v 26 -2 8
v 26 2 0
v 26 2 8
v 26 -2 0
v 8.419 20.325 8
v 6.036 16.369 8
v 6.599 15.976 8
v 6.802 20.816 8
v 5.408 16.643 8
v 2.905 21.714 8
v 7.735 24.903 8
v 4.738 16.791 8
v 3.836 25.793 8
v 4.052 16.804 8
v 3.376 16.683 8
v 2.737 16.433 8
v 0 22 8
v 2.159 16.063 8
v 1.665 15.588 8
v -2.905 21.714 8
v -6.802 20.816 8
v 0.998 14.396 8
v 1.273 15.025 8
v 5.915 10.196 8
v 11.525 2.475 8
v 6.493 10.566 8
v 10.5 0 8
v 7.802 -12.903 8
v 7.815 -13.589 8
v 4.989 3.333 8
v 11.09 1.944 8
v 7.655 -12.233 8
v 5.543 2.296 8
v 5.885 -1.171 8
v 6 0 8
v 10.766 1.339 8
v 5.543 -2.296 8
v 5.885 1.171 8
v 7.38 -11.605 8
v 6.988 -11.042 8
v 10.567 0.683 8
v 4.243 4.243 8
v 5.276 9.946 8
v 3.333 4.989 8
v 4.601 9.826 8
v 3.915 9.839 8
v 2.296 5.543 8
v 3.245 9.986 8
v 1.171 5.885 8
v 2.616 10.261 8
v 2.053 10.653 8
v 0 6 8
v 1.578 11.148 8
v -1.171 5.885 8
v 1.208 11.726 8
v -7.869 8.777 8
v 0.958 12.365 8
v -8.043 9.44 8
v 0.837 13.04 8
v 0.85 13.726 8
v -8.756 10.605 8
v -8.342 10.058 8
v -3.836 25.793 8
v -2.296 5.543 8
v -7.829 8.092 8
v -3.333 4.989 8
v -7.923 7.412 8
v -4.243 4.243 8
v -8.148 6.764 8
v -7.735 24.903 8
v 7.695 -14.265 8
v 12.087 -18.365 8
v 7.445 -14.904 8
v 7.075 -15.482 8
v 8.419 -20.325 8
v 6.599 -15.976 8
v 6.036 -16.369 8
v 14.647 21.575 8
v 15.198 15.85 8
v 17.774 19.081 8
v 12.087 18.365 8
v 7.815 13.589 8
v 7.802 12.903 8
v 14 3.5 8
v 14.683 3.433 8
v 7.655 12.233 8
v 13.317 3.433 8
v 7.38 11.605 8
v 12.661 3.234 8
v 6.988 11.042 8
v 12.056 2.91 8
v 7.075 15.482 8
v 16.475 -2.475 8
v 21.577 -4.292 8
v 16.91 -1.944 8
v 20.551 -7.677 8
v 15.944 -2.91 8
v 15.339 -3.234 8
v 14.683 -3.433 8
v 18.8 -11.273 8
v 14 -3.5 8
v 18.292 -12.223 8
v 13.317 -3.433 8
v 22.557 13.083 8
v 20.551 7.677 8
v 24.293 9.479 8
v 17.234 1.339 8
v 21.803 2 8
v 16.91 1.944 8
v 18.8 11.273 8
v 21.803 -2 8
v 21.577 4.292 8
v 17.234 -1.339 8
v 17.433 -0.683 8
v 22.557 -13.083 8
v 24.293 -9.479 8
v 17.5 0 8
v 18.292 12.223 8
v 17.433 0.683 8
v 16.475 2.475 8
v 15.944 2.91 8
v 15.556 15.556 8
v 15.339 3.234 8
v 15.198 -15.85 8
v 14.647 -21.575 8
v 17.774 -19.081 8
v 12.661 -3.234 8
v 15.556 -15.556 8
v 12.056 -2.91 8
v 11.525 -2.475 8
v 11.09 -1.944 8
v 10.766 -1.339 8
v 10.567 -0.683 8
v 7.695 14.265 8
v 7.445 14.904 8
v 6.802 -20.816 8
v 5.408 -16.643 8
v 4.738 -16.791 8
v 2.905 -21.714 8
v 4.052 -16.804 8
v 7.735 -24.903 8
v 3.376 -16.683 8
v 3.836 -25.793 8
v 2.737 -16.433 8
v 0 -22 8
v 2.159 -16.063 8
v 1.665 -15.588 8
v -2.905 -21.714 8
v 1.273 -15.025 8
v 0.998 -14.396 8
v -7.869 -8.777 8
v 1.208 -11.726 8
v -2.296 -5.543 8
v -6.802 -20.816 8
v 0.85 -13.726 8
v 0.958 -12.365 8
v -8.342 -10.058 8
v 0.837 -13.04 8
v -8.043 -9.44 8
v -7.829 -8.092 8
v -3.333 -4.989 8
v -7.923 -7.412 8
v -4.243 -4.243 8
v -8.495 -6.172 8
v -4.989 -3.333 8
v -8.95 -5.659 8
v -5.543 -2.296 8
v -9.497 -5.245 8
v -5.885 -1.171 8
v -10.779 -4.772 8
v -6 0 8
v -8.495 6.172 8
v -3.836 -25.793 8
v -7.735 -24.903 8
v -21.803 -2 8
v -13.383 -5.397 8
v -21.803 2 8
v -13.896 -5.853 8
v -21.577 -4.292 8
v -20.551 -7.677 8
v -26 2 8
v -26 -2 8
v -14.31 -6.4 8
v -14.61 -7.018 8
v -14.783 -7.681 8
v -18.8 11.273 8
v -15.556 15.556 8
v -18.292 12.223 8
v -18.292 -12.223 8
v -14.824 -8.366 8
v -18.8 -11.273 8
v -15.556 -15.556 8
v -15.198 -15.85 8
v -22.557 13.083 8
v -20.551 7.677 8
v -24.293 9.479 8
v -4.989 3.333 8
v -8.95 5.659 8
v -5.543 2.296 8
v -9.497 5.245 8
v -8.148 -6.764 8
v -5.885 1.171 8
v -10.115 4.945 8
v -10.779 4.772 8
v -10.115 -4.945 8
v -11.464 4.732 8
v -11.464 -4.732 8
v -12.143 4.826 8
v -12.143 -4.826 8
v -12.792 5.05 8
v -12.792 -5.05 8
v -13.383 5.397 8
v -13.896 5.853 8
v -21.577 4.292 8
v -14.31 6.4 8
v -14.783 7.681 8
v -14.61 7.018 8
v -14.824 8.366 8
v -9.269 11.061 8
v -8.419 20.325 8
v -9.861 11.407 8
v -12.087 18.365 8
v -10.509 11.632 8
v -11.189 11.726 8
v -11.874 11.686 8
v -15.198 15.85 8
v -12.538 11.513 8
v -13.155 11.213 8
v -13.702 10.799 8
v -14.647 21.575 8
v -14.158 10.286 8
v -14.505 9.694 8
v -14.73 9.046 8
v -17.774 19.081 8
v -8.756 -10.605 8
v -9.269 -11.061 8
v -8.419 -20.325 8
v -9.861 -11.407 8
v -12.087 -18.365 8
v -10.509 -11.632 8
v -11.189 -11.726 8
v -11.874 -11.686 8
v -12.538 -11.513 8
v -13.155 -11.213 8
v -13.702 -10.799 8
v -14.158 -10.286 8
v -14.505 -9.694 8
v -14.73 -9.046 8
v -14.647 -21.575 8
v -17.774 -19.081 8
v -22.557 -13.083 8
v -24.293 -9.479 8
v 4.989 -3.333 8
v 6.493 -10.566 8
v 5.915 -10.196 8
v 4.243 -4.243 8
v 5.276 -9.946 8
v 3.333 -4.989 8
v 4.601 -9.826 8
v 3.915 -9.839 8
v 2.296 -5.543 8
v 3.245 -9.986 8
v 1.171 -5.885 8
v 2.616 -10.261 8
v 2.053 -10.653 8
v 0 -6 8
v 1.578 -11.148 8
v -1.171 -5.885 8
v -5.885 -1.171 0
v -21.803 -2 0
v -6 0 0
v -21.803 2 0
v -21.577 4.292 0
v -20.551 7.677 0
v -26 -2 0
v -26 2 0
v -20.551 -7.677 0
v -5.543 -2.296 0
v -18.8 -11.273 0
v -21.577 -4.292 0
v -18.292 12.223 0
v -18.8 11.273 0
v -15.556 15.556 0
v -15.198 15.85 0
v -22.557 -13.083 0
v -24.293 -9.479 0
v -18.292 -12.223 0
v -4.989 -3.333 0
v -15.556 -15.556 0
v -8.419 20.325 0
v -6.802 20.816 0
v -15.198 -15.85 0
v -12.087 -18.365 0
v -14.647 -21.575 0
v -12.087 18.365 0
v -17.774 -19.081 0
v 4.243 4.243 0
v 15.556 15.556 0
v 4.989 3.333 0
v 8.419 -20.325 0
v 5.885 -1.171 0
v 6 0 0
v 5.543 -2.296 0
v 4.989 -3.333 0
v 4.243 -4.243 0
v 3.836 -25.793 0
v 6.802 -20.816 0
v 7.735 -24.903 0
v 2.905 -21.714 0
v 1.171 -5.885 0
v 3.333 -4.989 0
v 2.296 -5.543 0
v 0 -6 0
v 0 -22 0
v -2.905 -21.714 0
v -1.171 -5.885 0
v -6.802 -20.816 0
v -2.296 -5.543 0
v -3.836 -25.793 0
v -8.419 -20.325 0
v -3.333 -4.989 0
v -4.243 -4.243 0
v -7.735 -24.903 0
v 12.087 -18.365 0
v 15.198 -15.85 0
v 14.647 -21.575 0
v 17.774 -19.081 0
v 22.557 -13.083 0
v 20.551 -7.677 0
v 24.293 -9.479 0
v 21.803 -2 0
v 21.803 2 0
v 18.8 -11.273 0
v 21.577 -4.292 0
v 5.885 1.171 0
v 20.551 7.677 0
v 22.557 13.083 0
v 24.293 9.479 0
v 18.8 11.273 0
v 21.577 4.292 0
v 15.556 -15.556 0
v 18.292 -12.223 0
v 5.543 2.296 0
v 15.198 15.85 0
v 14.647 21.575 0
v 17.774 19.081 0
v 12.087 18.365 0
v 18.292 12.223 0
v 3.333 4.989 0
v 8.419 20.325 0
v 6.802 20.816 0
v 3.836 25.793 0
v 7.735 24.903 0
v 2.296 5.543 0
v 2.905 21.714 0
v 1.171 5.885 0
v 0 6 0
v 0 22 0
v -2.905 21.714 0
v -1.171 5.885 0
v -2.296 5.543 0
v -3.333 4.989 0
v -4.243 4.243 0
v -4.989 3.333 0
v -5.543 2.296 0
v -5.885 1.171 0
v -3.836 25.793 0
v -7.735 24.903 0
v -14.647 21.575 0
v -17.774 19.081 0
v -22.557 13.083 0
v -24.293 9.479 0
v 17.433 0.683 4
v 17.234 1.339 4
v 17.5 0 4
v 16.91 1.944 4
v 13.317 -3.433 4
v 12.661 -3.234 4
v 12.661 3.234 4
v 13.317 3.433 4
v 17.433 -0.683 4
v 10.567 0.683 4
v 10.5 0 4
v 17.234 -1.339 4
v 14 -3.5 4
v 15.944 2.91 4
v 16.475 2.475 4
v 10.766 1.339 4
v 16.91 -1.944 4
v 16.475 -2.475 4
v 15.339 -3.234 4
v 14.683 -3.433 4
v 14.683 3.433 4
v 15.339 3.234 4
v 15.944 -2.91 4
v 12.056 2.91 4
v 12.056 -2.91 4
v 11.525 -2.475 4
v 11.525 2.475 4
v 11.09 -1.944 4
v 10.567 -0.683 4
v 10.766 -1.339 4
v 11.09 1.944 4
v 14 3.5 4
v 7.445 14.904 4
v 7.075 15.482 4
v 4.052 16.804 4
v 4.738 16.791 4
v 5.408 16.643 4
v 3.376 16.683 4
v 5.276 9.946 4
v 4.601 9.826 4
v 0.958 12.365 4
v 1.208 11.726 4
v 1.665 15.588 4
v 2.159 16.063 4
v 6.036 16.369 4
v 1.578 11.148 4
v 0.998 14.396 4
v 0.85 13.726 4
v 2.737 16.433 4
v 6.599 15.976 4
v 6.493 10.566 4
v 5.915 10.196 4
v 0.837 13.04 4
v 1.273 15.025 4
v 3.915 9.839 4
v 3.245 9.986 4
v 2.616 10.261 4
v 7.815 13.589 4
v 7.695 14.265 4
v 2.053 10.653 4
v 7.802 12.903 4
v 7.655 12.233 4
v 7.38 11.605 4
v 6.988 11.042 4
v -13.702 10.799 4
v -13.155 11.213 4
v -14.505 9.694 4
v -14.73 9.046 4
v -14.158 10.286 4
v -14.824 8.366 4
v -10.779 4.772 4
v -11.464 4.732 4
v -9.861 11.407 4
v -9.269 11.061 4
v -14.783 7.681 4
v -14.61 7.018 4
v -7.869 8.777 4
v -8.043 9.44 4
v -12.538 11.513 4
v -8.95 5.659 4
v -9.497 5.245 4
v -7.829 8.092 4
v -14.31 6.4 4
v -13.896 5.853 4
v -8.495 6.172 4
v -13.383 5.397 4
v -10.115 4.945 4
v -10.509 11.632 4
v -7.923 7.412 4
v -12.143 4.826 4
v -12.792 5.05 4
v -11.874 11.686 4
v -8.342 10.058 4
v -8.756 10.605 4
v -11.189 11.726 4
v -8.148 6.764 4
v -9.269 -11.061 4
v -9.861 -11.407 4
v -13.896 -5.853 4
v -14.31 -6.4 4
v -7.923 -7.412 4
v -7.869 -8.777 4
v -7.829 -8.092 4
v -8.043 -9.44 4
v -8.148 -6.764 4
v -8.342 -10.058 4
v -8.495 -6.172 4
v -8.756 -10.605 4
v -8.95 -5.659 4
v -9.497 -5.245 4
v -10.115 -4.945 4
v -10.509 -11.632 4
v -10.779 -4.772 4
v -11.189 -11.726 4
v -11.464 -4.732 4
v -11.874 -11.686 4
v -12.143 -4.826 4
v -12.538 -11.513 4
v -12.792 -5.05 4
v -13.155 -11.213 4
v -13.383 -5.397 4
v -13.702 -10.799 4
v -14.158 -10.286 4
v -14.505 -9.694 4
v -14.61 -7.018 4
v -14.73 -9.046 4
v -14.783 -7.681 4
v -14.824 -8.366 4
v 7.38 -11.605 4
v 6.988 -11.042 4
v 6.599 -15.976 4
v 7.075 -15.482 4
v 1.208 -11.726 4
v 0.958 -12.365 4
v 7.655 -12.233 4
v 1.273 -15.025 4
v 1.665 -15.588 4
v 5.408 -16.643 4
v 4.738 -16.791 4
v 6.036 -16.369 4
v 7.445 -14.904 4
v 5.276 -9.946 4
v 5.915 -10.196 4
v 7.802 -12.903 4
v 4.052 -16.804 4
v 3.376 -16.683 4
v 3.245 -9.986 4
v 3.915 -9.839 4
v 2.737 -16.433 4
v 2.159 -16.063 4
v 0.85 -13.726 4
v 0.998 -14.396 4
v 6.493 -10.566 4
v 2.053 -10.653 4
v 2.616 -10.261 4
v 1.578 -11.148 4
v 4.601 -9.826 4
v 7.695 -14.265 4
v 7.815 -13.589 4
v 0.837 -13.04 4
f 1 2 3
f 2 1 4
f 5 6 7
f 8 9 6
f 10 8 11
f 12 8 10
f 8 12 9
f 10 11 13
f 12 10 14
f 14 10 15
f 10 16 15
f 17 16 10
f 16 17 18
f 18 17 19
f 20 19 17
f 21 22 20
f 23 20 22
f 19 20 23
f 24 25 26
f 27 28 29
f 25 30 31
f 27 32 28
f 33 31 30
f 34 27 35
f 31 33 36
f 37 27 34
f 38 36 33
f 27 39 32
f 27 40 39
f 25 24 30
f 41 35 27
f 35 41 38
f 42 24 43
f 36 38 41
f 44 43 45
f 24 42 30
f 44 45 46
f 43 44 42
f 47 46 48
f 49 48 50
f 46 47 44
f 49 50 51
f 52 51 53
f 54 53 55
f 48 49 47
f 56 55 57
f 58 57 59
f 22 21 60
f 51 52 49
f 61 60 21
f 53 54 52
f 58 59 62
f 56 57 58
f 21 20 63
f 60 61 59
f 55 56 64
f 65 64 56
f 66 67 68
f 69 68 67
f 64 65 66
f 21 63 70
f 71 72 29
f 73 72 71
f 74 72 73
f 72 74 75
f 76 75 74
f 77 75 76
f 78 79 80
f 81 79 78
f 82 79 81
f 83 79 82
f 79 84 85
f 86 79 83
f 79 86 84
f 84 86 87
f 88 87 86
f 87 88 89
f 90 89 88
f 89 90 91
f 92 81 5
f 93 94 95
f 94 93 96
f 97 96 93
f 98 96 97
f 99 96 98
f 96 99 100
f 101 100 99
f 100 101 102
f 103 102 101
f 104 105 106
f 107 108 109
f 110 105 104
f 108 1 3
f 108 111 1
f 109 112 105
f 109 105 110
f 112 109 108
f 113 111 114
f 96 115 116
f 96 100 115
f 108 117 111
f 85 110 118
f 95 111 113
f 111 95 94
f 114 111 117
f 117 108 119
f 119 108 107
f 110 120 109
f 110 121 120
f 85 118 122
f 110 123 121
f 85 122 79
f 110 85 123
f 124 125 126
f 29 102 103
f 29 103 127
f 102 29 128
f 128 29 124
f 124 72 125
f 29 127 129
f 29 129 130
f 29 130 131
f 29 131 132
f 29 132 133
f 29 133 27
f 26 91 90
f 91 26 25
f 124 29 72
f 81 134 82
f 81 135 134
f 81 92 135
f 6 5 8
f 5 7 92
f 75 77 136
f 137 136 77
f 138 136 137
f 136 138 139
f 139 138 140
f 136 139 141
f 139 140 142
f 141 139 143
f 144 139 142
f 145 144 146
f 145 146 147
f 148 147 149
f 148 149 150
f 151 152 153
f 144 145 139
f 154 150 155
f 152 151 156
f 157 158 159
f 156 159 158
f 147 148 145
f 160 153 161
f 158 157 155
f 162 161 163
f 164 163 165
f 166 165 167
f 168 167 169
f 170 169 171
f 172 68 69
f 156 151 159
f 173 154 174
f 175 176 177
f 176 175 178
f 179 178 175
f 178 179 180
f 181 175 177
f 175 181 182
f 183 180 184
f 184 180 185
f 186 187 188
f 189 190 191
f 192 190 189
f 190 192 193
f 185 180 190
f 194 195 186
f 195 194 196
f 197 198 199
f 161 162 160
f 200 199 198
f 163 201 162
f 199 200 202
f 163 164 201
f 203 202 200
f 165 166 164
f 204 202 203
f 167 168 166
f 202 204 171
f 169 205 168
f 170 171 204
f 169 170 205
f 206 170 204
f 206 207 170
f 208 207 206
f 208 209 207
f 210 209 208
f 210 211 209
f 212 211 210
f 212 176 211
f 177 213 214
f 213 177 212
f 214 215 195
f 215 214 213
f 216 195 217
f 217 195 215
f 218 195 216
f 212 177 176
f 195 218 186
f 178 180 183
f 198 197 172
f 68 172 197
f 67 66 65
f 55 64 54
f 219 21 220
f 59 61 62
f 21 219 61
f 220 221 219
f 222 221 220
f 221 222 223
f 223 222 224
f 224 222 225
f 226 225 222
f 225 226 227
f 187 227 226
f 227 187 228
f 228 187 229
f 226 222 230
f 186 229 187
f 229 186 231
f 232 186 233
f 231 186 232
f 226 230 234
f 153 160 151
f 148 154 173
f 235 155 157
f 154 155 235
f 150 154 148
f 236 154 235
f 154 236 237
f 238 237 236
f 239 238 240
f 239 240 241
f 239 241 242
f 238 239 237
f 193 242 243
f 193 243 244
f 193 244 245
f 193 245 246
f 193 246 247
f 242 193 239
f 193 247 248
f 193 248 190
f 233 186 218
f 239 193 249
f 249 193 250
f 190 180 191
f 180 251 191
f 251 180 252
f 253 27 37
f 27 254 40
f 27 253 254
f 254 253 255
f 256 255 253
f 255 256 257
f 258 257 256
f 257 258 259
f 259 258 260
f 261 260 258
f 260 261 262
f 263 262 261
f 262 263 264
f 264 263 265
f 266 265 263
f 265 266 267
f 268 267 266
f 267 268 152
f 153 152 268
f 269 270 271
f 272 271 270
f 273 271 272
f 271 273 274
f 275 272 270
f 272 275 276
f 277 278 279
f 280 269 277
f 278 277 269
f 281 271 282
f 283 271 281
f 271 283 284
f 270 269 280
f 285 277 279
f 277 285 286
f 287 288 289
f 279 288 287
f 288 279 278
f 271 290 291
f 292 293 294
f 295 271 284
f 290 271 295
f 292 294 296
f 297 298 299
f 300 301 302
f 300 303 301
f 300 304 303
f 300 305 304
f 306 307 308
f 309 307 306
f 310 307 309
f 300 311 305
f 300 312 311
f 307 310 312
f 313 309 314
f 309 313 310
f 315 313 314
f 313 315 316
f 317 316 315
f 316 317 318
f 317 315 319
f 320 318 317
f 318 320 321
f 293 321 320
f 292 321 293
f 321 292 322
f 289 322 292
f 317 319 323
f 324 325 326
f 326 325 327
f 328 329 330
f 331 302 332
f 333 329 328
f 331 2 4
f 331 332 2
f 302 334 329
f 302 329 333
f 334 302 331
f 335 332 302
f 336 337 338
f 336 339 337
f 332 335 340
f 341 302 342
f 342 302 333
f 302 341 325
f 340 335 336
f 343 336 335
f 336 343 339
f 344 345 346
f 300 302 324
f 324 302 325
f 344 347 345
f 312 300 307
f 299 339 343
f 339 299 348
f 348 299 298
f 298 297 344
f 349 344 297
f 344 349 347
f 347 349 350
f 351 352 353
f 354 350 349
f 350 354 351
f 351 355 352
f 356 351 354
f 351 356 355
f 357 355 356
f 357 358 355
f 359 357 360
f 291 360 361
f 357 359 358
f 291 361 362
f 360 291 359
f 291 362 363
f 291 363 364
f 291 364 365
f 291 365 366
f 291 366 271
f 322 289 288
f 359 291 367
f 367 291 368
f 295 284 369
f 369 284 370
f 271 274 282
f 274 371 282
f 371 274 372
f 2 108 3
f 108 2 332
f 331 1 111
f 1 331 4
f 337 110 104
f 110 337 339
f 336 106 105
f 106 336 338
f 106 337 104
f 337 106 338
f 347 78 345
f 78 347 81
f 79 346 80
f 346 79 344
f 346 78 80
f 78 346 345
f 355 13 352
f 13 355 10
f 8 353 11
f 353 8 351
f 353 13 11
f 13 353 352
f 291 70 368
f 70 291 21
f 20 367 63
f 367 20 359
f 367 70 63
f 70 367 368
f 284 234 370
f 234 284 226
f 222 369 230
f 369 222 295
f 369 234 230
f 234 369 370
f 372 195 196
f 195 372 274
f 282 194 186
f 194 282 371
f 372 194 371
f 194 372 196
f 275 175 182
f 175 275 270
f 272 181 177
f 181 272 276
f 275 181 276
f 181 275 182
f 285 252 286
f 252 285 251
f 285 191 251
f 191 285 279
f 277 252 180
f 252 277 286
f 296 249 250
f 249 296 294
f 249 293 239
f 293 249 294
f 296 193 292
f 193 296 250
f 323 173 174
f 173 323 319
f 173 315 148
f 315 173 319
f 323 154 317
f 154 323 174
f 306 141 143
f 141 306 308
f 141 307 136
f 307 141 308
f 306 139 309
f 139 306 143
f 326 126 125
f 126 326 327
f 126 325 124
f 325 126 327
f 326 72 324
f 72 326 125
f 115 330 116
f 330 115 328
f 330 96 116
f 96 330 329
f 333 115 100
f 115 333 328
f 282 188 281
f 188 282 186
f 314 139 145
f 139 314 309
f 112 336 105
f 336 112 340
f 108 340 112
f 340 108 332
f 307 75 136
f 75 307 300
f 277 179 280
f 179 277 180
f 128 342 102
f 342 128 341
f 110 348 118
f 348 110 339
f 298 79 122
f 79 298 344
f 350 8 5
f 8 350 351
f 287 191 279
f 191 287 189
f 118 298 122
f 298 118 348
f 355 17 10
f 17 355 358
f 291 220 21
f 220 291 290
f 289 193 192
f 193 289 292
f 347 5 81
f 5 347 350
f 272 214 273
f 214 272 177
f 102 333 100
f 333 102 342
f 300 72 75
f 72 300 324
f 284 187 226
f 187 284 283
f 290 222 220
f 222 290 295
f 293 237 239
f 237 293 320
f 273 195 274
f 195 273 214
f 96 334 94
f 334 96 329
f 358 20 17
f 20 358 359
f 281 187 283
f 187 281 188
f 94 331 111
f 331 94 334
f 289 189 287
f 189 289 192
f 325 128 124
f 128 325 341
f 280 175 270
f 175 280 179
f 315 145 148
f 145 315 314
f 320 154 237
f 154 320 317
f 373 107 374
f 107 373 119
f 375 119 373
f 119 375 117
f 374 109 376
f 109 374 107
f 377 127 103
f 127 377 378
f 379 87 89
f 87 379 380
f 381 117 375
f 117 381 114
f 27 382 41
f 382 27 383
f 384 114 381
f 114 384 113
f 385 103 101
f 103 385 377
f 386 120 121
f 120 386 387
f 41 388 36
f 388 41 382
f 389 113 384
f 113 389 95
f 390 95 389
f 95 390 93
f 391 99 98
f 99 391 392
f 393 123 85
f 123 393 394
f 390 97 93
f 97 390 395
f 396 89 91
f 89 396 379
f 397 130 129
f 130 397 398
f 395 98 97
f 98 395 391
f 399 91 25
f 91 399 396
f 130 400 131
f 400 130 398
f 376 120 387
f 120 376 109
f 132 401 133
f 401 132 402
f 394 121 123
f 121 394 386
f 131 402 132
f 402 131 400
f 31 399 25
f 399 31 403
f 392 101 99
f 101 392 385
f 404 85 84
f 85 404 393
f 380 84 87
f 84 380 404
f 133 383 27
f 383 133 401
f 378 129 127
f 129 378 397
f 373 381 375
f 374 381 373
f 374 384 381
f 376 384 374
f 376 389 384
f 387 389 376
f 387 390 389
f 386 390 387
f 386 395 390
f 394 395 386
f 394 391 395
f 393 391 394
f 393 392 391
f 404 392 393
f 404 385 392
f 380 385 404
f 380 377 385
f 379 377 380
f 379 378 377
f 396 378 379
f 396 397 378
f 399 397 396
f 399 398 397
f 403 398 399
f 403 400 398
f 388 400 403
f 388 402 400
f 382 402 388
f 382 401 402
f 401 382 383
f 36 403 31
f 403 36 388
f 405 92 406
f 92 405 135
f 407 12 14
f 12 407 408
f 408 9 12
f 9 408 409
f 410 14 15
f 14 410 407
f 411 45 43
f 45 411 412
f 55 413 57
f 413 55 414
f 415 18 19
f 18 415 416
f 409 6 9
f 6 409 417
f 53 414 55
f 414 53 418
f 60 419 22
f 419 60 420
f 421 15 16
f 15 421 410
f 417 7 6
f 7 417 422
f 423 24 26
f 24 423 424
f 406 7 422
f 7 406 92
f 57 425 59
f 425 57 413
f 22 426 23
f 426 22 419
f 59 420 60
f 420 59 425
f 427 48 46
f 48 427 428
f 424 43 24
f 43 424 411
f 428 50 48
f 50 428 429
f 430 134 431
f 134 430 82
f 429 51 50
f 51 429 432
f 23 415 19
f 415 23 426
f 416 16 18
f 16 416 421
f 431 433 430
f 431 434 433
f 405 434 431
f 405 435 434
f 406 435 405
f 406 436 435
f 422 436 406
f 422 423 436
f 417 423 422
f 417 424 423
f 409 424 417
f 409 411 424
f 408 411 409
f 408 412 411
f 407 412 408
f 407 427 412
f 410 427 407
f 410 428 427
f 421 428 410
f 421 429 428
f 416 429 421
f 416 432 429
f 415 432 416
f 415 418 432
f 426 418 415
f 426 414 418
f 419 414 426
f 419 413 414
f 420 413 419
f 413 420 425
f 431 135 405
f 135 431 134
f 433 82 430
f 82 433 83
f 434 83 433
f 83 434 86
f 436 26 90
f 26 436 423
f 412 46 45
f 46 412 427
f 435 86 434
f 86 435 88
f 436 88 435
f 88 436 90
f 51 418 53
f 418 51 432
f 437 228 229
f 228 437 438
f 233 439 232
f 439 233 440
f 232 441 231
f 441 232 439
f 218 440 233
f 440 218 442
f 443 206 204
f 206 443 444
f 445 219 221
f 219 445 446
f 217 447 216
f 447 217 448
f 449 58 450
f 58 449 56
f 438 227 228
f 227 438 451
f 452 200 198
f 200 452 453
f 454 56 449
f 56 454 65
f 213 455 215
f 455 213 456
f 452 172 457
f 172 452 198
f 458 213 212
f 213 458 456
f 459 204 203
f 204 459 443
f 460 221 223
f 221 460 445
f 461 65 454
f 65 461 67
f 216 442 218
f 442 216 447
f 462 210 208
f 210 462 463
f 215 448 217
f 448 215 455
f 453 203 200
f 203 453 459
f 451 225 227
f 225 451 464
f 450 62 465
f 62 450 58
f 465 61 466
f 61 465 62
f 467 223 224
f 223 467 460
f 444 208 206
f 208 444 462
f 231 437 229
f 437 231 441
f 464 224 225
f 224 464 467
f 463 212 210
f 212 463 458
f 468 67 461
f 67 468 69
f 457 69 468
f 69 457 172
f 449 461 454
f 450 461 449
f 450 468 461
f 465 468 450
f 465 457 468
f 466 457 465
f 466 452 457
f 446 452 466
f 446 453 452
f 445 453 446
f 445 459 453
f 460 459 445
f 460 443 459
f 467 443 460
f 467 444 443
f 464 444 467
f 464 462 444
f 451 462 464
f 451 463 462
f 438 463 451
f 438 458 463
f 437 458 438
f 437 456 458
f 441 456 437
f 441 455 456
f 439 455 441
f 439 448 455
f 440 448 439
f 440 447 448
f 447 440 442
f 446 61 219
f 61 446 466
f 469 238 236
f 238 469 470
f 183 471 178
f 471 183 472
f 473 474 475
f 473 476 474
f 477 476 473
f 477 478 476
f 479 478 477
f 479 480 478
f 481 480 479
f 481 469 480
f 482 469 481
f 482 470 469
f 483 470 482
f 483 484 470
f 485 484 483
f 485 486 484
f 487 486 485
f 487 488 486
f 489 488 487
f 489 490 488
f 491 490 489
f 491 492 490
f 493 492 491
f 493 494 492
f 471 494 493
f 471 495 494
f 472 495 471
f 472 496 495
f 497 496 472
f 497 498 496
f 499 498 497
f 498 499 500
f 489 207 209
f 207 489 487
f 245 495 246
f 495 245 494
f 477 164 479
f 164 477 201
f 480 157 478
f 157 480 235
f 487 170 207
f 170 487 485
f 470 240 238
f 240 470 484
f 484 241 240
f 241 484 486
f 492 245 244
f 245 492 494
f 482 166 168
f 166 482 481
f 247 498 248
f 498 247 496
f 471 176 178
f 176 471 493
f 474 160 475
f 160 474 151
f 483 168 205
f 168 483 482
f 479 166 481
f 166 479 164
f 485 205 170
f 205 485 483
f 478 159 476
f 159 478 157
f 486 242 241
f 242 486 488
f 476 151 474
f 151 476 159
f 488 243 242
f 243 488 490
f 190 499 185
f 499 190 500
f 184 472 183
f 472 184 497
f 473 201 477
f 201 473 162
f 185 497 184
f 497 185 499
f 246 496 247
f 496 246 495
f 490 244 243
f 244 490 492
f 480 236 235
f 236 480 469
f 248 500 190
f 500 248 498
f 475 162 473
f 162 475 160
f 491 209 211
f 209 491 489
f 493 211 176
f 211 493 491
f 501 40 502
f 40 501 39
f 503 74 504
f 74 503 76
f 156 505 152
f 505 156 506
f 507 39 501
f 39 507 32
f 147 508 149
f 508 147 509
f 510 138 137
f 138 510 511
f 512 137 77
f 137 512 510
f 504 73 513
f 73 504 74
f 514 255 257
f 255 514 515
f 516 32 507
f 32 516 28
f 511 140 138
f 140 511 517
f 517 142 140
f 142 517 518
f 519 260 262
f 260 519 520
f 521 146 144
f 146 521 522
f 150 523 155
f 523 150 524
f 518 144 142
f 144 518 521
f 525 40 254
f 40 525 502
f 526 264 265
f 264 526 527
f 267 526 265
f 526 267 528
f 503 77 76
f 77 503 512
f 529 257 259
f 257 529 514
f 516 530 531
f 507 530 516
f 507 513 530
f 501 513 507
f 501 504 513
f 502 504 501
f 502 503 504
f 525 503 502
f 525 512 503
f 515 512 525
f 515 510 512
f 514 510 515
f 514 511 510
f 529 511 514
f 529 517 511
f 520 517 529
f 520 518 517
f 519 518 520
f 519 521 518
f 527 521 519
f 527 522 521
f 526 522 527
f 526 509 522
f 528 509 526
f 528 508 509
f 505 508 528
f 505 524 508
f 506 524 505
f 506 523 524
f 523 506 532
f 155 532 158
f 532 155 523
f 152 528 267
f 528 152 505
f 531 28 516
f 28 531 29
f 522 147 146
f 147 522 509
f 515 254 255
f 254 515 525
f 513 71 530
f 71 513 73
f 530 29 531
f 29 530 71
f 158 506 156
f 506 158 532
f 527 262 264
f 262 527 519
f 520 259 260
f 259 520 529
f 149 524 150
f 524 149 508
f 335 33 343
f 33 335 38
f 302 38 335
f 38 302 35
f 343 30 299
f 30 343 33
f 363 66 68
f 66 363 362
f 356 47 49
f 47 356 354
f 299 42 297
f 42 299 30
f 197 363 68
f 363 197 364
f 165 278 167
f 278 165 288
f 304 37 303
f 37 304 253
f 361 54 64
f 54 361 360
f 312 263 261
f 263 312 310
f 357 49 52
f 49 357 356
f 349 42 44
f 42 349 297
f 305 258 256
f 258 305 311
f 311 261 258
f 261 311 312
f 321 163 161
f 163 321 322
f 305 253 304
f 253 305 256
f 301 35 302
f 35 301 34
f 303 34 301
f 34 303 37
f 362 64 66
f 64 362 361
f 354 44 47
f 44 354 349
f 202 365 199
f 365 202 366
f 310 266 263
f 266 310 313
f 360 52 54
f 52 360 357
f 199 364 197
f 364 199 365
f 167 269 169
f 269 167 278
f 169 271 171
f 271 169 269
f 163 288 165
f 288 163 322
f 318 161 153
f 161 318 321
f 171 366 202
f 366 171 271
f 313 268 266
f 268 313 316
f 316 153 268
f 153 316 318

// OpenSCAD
$fn = 32;

// ----------------------------------------------------------------------
// Spur blank: lightened gear blank
// ----------------------------------------------------------------------

// --- parameters (mm) ---
disc_r = 22;              // blank root radius
disc_t = 8;               // blank thickness
n_teeth = 14;             // stub tooth count
tooth_w = 4;              // tooth width at the root
tooth_h = 4;              // tooth height above the root
bore_r = 6;               // central bore radius
ring_r = 14;              // lightening pocket ring radius
pocket_r = 3.5;           // lightening pocket radius

out_r = disc_r + tooth_h;  // tip radius
bbox_x = 52.0;  // measured width over the teeth
bbox_y = 51.59;  // measured depth over the teeth

difference() {
union() {
  cylinder(r = disc_r, h = disc_t);
  for (i = [0 : n_teeth - 1])
    rotate([0, 0, i * 360 / n_teeth])
      translate([disc_r - 1, -tooth_w / 2, 0])
        cube([tooth_h + 1, tooth_w, disc_t]);
}
  translate([0, 0, -1]) cylinder(r = bore_r, h = disc_t + 2);
  for (i = [0 : 5])
    rotate([0, 0, i * 72])
      translate([ring_r, 0, disc_t - 4])
        cylinder(r = pocket_r, h = 5);
}
